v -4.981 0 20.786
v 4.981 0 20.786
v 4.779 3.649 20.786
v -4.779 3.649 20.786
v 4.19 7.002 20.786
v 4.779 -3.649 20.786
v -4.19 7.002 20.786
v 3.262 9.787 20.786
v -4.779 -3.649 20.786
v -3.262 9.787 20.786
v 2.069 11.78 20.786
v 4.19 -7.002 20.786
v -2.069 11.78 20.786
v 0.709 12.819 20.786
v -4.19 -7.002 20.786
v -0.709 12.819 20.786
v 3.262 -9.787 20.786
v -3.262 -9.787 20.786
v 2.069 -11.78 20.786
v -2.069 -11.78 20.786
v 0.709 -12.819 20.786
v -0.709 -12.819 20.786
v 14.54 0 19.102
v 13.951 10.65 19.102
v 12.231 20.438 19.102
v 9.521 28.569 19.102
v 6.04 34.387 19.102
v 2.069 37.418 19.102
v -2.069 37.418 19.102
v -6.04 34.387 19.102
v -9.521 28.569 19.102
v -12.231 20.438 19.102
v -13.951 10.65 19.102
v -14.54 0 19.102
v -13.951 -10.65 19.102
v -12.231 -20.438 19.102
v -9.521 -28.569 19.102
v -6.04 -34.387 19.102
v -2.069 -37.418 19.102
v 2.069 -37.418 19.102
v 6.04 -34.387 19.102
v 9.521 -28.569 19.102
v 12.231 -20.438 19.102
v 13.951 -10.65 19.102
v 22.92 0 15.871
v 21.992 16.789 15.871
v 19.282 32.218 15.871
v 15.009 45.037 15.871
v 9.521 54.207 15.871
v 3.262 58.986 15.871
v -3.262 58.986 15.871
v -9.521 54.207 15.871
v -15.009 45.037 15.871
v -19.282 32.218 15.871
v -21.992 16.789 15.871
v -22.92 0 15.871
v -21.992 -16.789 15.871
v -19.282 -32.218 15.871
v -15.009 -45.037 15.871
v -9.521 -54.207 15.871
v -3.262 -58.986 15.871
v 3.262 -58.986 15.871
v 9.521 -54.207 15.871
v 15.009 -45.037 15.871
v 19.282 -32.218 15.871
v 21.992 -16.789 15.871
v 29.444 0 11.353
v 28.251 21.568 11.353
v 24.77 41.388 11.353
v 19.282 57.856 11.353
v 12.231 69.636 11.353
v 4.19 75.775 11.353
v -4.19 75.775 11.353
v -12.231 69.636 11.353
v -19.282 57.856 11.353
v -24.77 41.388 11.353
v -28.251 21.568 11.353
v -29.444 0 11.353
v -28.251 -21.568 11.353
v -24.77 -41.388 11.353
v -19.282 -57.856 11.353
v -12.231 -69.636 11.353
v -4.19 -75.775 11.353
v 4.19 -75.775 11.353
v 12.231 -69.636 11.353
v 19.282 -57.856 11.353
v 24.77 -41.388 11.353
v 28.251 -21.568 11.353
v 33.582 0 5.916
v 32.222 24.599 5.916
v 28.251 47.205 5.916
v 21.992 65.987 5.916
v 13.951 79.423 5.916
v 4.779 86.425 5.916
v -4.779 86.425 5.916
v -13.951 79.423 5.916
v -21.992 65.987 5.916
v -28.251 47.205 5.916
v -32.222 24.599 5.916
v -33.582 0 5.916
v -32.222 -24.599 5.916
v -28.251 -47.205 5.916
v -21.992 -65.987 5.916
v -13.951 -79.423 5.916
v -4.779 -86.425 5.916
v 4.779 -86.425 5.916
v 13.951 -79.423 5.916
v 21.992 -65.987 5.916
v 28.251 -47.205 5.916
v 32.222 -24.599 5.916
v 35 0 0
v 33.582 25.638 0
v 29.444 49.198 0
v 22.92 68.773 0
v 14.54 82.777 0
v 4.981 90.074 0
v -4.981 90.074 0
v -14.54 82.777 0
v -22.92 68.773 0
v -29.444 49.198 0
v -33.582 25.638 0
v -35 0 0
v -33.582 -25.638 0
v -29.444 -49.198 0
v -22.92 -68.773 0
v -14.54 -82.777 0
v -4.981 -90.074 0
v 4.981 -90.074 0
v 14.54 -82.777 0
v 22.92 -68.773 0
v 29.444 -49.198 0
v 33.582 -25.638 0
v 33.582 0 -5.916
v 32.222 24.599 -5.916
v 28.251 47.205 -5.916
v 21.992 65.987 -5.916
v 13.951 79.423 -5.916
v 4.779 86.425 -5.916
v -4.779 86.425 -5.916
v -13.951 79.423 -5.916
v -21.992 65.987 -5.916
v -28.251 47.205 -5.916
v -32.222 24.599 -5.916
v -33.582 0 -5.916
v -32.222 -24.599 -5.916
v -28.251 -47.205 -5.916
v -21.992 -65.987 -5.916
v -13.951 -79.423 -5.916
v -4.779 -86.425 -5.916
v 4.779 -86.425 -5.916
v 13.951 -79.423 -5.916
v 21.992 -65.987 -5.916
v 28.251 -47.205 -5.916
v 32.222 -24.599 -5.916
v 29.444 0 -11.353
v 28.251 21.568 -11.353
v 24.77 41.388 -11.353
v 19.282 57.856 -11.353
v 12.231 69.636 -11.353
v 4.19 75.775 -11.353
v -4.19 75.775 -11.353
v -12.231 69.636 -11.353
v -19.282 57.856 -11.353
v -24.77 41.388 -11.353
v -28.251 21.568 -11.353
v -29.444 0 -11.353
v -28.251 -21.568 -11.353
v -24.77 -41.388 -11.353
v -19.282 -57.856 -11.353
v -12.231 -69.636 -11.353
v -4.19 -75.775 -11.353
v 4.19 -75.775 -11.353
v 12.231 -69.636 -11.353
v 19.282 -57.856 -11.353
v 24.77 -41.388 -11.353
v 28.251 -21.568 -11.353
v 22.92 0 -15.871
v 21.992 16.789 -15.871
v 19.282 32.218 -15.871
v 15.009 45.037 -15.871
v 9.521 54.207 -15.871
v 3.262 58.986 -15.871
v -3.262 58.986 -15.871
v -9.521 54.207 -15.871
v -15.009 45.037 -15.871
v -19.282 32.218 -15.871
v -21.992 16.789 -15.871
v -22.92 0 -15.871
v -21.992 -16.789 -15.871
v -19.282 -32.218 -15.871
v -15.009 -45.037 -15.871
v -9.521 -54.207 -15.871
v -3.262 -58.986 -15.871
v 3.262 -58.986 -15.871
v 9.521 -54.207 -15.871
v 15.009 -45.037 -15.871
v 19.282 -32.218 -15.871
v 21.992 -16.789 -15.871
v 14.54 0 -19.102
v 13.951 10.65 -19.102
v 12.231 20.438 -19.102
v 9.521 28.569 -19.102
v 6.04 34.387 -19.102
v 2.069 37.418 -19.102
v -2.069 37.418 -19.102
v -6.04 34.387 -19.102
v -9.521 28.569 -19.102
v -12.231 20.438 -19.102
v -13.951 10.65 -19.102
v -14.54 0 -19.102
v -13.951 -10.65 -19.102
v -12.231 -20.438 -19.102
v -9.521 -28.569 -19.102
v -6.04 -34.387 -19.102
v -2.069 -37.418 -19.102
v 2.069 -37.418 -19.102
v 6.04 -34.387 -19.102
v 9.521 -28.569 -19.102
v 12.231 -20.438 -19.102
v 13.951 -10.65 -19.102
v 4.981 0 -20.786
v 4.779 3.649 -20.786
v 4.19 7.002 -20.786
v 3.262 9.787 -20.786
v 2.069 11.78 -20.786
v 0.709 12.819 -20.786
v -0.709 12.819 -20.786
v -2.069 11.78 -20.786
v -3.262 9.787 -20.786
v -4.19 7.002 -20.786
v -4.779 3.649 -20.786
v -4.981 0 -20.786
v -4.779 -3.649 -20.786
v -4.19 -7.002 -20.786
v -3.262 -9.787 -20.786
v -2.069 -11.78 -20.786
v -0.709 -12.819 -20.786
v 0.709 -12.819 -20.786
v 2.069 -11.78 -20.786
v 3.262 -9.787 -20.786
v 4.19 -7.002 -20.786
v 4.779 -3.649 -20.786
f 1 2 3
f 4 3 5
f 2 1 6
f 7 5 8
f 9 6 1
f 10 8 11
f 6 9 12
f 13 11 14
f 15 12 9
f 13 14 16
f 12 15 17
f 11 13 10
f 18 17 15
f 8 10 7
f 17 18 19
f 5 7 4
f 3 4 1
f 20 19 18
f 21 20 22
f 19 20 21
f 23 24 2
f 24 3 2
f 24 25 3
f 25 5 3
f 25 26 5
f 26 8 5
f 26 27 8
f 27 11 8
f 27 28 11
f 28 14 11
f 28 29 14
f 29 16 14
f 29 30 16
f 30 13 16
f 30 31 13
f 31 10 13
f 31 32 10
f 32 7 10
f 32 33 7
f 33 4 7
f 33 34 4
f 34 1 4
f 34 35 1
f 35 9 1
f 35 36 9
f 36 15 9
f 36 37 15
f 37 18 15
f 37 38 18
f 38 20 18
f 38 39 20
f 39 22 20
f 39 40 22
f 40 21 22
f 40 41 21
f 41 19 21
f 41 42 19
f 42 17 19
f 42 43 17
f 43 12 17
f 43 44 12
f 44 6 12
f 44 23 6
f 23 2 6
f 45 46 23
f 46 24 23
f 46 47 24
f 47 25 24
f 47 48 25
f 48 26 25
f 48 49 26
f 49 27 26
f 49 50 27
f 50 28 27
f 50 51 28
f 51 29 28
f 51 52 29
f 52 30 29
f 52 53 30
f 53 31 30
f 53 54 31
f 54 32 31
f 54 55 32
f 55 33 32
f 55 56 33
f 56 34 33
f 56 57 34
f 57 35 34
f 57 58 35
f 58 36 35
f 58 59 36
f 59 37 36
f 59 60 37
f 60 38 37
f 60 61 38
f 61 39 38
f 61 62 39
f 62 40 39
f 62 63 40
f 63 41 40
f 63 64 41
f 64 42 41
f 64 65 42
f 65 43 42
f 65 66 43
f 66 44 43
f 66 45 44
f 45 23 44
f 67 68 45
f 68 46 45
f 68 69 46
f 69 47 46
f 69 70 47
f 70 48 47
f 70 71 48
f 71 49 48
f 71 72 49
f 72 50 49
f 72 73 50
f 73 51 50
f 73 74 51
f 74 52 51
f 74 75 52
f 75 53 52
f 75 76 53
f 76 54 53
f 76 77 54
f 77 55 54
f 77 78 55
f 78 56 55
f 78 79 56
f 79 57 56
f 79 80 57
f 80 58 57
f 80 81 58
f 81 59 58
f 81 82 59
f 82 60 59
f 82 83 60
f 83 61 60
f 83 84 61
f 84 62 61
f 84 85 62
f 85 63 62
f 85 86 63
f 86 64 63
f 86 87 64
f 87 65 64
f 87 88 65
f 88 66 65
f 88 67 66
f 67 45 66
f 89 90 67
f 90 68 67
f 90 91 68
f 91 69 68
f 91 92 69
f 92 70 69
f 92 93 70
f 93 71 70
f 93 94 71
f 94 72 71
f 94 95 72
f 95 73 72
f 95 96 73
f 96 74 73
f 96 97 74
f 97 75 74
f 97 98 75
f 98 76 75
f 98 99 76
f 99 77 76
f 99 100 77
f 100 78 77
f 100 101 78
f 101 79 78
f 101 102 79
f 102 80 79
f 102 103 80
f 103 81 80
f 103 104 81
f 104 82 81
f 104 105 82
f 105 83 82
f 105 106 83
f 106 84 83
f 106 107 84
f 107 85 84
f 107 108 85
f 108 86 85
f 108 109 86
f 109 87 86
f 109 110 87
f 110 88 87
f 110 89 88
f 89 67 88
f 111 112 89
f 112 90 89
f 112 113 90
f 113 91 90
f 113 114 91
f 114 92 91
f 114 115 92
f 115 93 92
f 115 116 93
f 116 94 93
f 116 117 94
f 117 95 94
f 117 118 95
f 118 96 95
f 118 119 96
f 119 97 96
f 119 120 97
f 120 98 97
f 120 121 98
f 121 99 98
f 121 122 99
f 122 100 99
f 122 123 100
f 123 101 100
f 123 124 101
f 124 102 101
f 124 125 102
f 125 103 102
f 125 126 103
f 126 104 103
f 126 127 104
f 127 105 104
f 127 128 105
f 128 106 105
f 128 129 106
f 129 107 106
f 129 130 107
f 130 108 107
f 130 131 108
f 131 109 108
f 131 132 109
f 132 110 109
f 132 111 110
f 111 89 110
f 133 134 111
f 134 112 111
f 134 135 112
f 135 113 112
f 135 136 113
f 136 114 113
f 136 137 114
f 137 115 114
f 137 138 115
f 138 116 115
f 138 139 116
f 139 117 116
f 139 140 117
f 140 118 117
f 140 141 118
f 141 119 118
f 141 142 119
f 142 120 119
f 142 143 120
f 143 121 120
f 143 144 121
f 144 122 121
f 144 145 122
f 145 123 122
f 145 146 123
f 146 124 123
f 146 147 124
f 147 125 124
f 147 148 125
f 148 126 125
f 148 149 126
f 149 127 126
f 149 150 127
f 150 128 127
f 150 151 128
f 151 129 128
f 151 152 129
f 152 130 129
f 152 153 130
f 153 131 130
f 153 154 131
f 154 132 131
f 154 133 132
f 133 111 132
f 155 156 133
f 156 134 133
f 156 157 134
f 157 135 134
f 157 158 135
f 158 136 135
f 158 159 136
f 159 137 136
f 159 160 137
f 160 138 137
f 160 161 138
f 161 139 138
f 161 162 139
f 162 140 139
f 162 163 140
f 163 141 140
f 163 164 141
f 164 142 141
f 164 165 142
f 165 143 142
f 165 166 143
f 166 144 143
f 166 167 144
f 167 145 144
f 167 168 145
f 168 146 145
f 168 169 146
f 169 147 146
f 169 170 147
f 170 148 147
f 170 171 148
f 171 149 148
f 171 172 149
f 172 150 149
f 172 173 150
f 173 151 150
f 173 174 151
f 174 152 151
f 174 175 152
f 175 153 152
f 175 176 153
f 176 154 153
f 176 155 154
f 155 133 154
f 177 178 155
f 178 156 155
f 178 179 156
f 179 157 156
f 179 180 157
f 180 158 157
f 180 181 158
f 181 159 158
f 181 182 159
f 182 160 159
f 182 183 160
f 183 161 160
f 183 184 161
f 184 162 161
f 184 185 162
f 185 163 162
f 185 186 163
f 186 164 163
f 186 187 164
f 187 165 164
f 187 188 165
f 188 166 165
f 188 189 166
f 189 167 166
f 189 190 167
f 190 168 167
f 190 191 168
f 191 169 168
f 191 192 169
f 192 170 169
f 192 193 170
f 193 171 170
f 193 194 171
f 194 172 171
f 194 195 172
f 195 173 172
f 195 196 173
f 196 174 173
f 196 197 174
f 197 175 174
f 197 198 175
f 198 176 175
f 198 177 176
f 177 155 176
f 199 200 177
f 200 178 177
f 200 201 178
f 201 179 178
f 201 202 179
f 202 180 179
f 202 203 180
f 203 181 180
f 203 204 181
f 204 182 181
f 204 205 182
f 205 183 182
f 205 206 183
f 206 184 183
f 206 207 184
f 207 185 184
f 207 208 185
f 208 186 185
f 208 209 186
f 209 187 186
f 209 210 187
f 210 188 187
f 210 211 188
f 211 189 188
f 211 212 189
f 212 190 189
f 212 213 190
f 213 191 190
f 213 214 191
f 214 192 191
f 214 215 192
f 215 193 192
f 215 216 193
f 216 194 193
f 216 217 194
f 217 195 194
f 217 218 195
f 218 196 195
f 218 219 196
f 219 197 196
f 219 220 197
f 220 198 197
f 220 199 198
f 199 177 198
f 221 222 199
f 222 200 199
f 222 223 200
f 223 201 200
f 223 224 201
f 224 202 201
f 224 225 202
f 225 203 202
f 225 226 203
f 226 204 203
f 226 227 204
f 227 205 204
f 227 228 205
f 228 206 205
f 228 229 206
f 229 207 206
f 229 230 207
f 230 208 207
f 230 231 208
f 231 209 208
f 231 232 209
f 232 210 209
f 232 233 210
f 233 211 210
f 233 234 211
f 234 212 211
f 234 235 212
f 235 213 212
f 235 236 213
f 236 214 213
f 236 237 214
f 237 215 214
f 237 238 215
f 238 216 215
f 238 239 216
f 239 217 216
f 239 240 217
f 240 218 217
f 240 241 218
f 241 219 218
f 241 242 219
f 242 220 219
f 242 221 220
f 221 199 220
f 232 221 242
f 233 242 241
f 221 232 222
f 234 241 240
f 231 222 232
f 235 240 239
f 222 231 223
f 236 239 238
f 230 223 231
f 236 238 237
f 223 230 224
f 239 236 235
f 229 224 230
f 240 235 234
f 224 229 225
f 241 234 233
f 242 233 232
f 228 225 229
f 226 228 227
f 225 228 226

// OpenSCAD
// Generated by SolidPython 1.0.1 on 2020-07-29 00:46:46


scale(v = [5, 13, 3]) {
	sphere(r = 7);
}
/***********************************************
*********      SolidPython code:      **********
************************************************
 
# import packages: SolidPython
from solid import *
from solid.utils import *
from itertools import chain, combinations, permutations


class Resize:

    def __init__(self, scad_file):
        self.scad_file = scad_file
        #self.scad_file = import_scad(scad_file)
        # cone/cylinder param:
        self.r1 = 0
        self.r2 = 0
        self.h = 0
        # rectangular prism param:
        self.w = 0
        self.l = 0
        # ellipse param:
        self.r = 0

    # import OpenScad code (file name corresponds to shape)


    # classify shape + parameters
    def assign(self, param1, param2, param3):
        if self.scad_file == 'cone.scad':
            self.r1 = param1
            self.r2 = param2
            self.h = param3
        elif self.scad_file == 'cylinder.scad':
            self.r1 = param1
            self.r2 = param2
            self.h = param3
        elif self.scad_file == 'rectangularPrism.scad':
            self.h = param1
            self.l = param2
            self.w = param3
        else:
            self.r = param1
            self.h = param2

    # resize parameters
    def iterate(self):
        x = range(3, 20, 2)
        i = 1
        if self.scad_file == 'cone.scad':
            tempList = list(permutations(x, 2))
            for temp in tempList:
                param1 = temp[0]
                param2 = temp[1]
                filepath = 'produced_scad_files/' + 'cone' + str(param1) + '_' + str(param2) + '_' + '.scad'
                scad_render_to_file(cylinder(h=param1, r1=param2, r2=0), filepath)

        elif self.scad_file == 'cylinder.scad':
            tempList = list(permutations(x, 3))
            for temp in tempList:
                param1 = temp[0]
                param2 = temp[1]
                filepath = 'produced_scad_files/' + 'cylinder' + str(param1) + '_' + str(param2) + '_' + '.scad'
                scad_render_to_file(cylinder(h=param1, r1=param2, r2=param2), filepath)

        elif self.scad_file == 'rectangularPrism.scad':
            tempList = list(permutations(x, 3))
            for temp in tempList:
                param1 = temp[0]
                param2 = temp[1]
                param3 = temp[2]
                filepath = 'produced_scad_files/' + 'rectangularPrism' + str(param1) + '_' + str(param2) + '_' + str(
                    param3) + '.scad'
                scad_render_to_file(cube(size=(param1, param2, param3)), filepath)

        elif self.scad_file == 'ellipse.scad':
            tempList = list(permutations(x, 4))
            for temp in tempList:
                param1 = temp[0]
                param2 = temp[1]
                param3 = temp[2]
                param4 = temp[3]
                filepath = 'produced_scad_files/' + 'ellipse' + str(param1) + '_' + str(param2) + '_' + str(param3) + '_' + str(param4) + '.scad'
                scad_render_to_file(scale([param1, param2, param3])(sphere(r=param4)), filepath)

    def render_to_scadfile(self):
        scad_render_to_file(scad, 'example.scad') 
 
************************************************/
